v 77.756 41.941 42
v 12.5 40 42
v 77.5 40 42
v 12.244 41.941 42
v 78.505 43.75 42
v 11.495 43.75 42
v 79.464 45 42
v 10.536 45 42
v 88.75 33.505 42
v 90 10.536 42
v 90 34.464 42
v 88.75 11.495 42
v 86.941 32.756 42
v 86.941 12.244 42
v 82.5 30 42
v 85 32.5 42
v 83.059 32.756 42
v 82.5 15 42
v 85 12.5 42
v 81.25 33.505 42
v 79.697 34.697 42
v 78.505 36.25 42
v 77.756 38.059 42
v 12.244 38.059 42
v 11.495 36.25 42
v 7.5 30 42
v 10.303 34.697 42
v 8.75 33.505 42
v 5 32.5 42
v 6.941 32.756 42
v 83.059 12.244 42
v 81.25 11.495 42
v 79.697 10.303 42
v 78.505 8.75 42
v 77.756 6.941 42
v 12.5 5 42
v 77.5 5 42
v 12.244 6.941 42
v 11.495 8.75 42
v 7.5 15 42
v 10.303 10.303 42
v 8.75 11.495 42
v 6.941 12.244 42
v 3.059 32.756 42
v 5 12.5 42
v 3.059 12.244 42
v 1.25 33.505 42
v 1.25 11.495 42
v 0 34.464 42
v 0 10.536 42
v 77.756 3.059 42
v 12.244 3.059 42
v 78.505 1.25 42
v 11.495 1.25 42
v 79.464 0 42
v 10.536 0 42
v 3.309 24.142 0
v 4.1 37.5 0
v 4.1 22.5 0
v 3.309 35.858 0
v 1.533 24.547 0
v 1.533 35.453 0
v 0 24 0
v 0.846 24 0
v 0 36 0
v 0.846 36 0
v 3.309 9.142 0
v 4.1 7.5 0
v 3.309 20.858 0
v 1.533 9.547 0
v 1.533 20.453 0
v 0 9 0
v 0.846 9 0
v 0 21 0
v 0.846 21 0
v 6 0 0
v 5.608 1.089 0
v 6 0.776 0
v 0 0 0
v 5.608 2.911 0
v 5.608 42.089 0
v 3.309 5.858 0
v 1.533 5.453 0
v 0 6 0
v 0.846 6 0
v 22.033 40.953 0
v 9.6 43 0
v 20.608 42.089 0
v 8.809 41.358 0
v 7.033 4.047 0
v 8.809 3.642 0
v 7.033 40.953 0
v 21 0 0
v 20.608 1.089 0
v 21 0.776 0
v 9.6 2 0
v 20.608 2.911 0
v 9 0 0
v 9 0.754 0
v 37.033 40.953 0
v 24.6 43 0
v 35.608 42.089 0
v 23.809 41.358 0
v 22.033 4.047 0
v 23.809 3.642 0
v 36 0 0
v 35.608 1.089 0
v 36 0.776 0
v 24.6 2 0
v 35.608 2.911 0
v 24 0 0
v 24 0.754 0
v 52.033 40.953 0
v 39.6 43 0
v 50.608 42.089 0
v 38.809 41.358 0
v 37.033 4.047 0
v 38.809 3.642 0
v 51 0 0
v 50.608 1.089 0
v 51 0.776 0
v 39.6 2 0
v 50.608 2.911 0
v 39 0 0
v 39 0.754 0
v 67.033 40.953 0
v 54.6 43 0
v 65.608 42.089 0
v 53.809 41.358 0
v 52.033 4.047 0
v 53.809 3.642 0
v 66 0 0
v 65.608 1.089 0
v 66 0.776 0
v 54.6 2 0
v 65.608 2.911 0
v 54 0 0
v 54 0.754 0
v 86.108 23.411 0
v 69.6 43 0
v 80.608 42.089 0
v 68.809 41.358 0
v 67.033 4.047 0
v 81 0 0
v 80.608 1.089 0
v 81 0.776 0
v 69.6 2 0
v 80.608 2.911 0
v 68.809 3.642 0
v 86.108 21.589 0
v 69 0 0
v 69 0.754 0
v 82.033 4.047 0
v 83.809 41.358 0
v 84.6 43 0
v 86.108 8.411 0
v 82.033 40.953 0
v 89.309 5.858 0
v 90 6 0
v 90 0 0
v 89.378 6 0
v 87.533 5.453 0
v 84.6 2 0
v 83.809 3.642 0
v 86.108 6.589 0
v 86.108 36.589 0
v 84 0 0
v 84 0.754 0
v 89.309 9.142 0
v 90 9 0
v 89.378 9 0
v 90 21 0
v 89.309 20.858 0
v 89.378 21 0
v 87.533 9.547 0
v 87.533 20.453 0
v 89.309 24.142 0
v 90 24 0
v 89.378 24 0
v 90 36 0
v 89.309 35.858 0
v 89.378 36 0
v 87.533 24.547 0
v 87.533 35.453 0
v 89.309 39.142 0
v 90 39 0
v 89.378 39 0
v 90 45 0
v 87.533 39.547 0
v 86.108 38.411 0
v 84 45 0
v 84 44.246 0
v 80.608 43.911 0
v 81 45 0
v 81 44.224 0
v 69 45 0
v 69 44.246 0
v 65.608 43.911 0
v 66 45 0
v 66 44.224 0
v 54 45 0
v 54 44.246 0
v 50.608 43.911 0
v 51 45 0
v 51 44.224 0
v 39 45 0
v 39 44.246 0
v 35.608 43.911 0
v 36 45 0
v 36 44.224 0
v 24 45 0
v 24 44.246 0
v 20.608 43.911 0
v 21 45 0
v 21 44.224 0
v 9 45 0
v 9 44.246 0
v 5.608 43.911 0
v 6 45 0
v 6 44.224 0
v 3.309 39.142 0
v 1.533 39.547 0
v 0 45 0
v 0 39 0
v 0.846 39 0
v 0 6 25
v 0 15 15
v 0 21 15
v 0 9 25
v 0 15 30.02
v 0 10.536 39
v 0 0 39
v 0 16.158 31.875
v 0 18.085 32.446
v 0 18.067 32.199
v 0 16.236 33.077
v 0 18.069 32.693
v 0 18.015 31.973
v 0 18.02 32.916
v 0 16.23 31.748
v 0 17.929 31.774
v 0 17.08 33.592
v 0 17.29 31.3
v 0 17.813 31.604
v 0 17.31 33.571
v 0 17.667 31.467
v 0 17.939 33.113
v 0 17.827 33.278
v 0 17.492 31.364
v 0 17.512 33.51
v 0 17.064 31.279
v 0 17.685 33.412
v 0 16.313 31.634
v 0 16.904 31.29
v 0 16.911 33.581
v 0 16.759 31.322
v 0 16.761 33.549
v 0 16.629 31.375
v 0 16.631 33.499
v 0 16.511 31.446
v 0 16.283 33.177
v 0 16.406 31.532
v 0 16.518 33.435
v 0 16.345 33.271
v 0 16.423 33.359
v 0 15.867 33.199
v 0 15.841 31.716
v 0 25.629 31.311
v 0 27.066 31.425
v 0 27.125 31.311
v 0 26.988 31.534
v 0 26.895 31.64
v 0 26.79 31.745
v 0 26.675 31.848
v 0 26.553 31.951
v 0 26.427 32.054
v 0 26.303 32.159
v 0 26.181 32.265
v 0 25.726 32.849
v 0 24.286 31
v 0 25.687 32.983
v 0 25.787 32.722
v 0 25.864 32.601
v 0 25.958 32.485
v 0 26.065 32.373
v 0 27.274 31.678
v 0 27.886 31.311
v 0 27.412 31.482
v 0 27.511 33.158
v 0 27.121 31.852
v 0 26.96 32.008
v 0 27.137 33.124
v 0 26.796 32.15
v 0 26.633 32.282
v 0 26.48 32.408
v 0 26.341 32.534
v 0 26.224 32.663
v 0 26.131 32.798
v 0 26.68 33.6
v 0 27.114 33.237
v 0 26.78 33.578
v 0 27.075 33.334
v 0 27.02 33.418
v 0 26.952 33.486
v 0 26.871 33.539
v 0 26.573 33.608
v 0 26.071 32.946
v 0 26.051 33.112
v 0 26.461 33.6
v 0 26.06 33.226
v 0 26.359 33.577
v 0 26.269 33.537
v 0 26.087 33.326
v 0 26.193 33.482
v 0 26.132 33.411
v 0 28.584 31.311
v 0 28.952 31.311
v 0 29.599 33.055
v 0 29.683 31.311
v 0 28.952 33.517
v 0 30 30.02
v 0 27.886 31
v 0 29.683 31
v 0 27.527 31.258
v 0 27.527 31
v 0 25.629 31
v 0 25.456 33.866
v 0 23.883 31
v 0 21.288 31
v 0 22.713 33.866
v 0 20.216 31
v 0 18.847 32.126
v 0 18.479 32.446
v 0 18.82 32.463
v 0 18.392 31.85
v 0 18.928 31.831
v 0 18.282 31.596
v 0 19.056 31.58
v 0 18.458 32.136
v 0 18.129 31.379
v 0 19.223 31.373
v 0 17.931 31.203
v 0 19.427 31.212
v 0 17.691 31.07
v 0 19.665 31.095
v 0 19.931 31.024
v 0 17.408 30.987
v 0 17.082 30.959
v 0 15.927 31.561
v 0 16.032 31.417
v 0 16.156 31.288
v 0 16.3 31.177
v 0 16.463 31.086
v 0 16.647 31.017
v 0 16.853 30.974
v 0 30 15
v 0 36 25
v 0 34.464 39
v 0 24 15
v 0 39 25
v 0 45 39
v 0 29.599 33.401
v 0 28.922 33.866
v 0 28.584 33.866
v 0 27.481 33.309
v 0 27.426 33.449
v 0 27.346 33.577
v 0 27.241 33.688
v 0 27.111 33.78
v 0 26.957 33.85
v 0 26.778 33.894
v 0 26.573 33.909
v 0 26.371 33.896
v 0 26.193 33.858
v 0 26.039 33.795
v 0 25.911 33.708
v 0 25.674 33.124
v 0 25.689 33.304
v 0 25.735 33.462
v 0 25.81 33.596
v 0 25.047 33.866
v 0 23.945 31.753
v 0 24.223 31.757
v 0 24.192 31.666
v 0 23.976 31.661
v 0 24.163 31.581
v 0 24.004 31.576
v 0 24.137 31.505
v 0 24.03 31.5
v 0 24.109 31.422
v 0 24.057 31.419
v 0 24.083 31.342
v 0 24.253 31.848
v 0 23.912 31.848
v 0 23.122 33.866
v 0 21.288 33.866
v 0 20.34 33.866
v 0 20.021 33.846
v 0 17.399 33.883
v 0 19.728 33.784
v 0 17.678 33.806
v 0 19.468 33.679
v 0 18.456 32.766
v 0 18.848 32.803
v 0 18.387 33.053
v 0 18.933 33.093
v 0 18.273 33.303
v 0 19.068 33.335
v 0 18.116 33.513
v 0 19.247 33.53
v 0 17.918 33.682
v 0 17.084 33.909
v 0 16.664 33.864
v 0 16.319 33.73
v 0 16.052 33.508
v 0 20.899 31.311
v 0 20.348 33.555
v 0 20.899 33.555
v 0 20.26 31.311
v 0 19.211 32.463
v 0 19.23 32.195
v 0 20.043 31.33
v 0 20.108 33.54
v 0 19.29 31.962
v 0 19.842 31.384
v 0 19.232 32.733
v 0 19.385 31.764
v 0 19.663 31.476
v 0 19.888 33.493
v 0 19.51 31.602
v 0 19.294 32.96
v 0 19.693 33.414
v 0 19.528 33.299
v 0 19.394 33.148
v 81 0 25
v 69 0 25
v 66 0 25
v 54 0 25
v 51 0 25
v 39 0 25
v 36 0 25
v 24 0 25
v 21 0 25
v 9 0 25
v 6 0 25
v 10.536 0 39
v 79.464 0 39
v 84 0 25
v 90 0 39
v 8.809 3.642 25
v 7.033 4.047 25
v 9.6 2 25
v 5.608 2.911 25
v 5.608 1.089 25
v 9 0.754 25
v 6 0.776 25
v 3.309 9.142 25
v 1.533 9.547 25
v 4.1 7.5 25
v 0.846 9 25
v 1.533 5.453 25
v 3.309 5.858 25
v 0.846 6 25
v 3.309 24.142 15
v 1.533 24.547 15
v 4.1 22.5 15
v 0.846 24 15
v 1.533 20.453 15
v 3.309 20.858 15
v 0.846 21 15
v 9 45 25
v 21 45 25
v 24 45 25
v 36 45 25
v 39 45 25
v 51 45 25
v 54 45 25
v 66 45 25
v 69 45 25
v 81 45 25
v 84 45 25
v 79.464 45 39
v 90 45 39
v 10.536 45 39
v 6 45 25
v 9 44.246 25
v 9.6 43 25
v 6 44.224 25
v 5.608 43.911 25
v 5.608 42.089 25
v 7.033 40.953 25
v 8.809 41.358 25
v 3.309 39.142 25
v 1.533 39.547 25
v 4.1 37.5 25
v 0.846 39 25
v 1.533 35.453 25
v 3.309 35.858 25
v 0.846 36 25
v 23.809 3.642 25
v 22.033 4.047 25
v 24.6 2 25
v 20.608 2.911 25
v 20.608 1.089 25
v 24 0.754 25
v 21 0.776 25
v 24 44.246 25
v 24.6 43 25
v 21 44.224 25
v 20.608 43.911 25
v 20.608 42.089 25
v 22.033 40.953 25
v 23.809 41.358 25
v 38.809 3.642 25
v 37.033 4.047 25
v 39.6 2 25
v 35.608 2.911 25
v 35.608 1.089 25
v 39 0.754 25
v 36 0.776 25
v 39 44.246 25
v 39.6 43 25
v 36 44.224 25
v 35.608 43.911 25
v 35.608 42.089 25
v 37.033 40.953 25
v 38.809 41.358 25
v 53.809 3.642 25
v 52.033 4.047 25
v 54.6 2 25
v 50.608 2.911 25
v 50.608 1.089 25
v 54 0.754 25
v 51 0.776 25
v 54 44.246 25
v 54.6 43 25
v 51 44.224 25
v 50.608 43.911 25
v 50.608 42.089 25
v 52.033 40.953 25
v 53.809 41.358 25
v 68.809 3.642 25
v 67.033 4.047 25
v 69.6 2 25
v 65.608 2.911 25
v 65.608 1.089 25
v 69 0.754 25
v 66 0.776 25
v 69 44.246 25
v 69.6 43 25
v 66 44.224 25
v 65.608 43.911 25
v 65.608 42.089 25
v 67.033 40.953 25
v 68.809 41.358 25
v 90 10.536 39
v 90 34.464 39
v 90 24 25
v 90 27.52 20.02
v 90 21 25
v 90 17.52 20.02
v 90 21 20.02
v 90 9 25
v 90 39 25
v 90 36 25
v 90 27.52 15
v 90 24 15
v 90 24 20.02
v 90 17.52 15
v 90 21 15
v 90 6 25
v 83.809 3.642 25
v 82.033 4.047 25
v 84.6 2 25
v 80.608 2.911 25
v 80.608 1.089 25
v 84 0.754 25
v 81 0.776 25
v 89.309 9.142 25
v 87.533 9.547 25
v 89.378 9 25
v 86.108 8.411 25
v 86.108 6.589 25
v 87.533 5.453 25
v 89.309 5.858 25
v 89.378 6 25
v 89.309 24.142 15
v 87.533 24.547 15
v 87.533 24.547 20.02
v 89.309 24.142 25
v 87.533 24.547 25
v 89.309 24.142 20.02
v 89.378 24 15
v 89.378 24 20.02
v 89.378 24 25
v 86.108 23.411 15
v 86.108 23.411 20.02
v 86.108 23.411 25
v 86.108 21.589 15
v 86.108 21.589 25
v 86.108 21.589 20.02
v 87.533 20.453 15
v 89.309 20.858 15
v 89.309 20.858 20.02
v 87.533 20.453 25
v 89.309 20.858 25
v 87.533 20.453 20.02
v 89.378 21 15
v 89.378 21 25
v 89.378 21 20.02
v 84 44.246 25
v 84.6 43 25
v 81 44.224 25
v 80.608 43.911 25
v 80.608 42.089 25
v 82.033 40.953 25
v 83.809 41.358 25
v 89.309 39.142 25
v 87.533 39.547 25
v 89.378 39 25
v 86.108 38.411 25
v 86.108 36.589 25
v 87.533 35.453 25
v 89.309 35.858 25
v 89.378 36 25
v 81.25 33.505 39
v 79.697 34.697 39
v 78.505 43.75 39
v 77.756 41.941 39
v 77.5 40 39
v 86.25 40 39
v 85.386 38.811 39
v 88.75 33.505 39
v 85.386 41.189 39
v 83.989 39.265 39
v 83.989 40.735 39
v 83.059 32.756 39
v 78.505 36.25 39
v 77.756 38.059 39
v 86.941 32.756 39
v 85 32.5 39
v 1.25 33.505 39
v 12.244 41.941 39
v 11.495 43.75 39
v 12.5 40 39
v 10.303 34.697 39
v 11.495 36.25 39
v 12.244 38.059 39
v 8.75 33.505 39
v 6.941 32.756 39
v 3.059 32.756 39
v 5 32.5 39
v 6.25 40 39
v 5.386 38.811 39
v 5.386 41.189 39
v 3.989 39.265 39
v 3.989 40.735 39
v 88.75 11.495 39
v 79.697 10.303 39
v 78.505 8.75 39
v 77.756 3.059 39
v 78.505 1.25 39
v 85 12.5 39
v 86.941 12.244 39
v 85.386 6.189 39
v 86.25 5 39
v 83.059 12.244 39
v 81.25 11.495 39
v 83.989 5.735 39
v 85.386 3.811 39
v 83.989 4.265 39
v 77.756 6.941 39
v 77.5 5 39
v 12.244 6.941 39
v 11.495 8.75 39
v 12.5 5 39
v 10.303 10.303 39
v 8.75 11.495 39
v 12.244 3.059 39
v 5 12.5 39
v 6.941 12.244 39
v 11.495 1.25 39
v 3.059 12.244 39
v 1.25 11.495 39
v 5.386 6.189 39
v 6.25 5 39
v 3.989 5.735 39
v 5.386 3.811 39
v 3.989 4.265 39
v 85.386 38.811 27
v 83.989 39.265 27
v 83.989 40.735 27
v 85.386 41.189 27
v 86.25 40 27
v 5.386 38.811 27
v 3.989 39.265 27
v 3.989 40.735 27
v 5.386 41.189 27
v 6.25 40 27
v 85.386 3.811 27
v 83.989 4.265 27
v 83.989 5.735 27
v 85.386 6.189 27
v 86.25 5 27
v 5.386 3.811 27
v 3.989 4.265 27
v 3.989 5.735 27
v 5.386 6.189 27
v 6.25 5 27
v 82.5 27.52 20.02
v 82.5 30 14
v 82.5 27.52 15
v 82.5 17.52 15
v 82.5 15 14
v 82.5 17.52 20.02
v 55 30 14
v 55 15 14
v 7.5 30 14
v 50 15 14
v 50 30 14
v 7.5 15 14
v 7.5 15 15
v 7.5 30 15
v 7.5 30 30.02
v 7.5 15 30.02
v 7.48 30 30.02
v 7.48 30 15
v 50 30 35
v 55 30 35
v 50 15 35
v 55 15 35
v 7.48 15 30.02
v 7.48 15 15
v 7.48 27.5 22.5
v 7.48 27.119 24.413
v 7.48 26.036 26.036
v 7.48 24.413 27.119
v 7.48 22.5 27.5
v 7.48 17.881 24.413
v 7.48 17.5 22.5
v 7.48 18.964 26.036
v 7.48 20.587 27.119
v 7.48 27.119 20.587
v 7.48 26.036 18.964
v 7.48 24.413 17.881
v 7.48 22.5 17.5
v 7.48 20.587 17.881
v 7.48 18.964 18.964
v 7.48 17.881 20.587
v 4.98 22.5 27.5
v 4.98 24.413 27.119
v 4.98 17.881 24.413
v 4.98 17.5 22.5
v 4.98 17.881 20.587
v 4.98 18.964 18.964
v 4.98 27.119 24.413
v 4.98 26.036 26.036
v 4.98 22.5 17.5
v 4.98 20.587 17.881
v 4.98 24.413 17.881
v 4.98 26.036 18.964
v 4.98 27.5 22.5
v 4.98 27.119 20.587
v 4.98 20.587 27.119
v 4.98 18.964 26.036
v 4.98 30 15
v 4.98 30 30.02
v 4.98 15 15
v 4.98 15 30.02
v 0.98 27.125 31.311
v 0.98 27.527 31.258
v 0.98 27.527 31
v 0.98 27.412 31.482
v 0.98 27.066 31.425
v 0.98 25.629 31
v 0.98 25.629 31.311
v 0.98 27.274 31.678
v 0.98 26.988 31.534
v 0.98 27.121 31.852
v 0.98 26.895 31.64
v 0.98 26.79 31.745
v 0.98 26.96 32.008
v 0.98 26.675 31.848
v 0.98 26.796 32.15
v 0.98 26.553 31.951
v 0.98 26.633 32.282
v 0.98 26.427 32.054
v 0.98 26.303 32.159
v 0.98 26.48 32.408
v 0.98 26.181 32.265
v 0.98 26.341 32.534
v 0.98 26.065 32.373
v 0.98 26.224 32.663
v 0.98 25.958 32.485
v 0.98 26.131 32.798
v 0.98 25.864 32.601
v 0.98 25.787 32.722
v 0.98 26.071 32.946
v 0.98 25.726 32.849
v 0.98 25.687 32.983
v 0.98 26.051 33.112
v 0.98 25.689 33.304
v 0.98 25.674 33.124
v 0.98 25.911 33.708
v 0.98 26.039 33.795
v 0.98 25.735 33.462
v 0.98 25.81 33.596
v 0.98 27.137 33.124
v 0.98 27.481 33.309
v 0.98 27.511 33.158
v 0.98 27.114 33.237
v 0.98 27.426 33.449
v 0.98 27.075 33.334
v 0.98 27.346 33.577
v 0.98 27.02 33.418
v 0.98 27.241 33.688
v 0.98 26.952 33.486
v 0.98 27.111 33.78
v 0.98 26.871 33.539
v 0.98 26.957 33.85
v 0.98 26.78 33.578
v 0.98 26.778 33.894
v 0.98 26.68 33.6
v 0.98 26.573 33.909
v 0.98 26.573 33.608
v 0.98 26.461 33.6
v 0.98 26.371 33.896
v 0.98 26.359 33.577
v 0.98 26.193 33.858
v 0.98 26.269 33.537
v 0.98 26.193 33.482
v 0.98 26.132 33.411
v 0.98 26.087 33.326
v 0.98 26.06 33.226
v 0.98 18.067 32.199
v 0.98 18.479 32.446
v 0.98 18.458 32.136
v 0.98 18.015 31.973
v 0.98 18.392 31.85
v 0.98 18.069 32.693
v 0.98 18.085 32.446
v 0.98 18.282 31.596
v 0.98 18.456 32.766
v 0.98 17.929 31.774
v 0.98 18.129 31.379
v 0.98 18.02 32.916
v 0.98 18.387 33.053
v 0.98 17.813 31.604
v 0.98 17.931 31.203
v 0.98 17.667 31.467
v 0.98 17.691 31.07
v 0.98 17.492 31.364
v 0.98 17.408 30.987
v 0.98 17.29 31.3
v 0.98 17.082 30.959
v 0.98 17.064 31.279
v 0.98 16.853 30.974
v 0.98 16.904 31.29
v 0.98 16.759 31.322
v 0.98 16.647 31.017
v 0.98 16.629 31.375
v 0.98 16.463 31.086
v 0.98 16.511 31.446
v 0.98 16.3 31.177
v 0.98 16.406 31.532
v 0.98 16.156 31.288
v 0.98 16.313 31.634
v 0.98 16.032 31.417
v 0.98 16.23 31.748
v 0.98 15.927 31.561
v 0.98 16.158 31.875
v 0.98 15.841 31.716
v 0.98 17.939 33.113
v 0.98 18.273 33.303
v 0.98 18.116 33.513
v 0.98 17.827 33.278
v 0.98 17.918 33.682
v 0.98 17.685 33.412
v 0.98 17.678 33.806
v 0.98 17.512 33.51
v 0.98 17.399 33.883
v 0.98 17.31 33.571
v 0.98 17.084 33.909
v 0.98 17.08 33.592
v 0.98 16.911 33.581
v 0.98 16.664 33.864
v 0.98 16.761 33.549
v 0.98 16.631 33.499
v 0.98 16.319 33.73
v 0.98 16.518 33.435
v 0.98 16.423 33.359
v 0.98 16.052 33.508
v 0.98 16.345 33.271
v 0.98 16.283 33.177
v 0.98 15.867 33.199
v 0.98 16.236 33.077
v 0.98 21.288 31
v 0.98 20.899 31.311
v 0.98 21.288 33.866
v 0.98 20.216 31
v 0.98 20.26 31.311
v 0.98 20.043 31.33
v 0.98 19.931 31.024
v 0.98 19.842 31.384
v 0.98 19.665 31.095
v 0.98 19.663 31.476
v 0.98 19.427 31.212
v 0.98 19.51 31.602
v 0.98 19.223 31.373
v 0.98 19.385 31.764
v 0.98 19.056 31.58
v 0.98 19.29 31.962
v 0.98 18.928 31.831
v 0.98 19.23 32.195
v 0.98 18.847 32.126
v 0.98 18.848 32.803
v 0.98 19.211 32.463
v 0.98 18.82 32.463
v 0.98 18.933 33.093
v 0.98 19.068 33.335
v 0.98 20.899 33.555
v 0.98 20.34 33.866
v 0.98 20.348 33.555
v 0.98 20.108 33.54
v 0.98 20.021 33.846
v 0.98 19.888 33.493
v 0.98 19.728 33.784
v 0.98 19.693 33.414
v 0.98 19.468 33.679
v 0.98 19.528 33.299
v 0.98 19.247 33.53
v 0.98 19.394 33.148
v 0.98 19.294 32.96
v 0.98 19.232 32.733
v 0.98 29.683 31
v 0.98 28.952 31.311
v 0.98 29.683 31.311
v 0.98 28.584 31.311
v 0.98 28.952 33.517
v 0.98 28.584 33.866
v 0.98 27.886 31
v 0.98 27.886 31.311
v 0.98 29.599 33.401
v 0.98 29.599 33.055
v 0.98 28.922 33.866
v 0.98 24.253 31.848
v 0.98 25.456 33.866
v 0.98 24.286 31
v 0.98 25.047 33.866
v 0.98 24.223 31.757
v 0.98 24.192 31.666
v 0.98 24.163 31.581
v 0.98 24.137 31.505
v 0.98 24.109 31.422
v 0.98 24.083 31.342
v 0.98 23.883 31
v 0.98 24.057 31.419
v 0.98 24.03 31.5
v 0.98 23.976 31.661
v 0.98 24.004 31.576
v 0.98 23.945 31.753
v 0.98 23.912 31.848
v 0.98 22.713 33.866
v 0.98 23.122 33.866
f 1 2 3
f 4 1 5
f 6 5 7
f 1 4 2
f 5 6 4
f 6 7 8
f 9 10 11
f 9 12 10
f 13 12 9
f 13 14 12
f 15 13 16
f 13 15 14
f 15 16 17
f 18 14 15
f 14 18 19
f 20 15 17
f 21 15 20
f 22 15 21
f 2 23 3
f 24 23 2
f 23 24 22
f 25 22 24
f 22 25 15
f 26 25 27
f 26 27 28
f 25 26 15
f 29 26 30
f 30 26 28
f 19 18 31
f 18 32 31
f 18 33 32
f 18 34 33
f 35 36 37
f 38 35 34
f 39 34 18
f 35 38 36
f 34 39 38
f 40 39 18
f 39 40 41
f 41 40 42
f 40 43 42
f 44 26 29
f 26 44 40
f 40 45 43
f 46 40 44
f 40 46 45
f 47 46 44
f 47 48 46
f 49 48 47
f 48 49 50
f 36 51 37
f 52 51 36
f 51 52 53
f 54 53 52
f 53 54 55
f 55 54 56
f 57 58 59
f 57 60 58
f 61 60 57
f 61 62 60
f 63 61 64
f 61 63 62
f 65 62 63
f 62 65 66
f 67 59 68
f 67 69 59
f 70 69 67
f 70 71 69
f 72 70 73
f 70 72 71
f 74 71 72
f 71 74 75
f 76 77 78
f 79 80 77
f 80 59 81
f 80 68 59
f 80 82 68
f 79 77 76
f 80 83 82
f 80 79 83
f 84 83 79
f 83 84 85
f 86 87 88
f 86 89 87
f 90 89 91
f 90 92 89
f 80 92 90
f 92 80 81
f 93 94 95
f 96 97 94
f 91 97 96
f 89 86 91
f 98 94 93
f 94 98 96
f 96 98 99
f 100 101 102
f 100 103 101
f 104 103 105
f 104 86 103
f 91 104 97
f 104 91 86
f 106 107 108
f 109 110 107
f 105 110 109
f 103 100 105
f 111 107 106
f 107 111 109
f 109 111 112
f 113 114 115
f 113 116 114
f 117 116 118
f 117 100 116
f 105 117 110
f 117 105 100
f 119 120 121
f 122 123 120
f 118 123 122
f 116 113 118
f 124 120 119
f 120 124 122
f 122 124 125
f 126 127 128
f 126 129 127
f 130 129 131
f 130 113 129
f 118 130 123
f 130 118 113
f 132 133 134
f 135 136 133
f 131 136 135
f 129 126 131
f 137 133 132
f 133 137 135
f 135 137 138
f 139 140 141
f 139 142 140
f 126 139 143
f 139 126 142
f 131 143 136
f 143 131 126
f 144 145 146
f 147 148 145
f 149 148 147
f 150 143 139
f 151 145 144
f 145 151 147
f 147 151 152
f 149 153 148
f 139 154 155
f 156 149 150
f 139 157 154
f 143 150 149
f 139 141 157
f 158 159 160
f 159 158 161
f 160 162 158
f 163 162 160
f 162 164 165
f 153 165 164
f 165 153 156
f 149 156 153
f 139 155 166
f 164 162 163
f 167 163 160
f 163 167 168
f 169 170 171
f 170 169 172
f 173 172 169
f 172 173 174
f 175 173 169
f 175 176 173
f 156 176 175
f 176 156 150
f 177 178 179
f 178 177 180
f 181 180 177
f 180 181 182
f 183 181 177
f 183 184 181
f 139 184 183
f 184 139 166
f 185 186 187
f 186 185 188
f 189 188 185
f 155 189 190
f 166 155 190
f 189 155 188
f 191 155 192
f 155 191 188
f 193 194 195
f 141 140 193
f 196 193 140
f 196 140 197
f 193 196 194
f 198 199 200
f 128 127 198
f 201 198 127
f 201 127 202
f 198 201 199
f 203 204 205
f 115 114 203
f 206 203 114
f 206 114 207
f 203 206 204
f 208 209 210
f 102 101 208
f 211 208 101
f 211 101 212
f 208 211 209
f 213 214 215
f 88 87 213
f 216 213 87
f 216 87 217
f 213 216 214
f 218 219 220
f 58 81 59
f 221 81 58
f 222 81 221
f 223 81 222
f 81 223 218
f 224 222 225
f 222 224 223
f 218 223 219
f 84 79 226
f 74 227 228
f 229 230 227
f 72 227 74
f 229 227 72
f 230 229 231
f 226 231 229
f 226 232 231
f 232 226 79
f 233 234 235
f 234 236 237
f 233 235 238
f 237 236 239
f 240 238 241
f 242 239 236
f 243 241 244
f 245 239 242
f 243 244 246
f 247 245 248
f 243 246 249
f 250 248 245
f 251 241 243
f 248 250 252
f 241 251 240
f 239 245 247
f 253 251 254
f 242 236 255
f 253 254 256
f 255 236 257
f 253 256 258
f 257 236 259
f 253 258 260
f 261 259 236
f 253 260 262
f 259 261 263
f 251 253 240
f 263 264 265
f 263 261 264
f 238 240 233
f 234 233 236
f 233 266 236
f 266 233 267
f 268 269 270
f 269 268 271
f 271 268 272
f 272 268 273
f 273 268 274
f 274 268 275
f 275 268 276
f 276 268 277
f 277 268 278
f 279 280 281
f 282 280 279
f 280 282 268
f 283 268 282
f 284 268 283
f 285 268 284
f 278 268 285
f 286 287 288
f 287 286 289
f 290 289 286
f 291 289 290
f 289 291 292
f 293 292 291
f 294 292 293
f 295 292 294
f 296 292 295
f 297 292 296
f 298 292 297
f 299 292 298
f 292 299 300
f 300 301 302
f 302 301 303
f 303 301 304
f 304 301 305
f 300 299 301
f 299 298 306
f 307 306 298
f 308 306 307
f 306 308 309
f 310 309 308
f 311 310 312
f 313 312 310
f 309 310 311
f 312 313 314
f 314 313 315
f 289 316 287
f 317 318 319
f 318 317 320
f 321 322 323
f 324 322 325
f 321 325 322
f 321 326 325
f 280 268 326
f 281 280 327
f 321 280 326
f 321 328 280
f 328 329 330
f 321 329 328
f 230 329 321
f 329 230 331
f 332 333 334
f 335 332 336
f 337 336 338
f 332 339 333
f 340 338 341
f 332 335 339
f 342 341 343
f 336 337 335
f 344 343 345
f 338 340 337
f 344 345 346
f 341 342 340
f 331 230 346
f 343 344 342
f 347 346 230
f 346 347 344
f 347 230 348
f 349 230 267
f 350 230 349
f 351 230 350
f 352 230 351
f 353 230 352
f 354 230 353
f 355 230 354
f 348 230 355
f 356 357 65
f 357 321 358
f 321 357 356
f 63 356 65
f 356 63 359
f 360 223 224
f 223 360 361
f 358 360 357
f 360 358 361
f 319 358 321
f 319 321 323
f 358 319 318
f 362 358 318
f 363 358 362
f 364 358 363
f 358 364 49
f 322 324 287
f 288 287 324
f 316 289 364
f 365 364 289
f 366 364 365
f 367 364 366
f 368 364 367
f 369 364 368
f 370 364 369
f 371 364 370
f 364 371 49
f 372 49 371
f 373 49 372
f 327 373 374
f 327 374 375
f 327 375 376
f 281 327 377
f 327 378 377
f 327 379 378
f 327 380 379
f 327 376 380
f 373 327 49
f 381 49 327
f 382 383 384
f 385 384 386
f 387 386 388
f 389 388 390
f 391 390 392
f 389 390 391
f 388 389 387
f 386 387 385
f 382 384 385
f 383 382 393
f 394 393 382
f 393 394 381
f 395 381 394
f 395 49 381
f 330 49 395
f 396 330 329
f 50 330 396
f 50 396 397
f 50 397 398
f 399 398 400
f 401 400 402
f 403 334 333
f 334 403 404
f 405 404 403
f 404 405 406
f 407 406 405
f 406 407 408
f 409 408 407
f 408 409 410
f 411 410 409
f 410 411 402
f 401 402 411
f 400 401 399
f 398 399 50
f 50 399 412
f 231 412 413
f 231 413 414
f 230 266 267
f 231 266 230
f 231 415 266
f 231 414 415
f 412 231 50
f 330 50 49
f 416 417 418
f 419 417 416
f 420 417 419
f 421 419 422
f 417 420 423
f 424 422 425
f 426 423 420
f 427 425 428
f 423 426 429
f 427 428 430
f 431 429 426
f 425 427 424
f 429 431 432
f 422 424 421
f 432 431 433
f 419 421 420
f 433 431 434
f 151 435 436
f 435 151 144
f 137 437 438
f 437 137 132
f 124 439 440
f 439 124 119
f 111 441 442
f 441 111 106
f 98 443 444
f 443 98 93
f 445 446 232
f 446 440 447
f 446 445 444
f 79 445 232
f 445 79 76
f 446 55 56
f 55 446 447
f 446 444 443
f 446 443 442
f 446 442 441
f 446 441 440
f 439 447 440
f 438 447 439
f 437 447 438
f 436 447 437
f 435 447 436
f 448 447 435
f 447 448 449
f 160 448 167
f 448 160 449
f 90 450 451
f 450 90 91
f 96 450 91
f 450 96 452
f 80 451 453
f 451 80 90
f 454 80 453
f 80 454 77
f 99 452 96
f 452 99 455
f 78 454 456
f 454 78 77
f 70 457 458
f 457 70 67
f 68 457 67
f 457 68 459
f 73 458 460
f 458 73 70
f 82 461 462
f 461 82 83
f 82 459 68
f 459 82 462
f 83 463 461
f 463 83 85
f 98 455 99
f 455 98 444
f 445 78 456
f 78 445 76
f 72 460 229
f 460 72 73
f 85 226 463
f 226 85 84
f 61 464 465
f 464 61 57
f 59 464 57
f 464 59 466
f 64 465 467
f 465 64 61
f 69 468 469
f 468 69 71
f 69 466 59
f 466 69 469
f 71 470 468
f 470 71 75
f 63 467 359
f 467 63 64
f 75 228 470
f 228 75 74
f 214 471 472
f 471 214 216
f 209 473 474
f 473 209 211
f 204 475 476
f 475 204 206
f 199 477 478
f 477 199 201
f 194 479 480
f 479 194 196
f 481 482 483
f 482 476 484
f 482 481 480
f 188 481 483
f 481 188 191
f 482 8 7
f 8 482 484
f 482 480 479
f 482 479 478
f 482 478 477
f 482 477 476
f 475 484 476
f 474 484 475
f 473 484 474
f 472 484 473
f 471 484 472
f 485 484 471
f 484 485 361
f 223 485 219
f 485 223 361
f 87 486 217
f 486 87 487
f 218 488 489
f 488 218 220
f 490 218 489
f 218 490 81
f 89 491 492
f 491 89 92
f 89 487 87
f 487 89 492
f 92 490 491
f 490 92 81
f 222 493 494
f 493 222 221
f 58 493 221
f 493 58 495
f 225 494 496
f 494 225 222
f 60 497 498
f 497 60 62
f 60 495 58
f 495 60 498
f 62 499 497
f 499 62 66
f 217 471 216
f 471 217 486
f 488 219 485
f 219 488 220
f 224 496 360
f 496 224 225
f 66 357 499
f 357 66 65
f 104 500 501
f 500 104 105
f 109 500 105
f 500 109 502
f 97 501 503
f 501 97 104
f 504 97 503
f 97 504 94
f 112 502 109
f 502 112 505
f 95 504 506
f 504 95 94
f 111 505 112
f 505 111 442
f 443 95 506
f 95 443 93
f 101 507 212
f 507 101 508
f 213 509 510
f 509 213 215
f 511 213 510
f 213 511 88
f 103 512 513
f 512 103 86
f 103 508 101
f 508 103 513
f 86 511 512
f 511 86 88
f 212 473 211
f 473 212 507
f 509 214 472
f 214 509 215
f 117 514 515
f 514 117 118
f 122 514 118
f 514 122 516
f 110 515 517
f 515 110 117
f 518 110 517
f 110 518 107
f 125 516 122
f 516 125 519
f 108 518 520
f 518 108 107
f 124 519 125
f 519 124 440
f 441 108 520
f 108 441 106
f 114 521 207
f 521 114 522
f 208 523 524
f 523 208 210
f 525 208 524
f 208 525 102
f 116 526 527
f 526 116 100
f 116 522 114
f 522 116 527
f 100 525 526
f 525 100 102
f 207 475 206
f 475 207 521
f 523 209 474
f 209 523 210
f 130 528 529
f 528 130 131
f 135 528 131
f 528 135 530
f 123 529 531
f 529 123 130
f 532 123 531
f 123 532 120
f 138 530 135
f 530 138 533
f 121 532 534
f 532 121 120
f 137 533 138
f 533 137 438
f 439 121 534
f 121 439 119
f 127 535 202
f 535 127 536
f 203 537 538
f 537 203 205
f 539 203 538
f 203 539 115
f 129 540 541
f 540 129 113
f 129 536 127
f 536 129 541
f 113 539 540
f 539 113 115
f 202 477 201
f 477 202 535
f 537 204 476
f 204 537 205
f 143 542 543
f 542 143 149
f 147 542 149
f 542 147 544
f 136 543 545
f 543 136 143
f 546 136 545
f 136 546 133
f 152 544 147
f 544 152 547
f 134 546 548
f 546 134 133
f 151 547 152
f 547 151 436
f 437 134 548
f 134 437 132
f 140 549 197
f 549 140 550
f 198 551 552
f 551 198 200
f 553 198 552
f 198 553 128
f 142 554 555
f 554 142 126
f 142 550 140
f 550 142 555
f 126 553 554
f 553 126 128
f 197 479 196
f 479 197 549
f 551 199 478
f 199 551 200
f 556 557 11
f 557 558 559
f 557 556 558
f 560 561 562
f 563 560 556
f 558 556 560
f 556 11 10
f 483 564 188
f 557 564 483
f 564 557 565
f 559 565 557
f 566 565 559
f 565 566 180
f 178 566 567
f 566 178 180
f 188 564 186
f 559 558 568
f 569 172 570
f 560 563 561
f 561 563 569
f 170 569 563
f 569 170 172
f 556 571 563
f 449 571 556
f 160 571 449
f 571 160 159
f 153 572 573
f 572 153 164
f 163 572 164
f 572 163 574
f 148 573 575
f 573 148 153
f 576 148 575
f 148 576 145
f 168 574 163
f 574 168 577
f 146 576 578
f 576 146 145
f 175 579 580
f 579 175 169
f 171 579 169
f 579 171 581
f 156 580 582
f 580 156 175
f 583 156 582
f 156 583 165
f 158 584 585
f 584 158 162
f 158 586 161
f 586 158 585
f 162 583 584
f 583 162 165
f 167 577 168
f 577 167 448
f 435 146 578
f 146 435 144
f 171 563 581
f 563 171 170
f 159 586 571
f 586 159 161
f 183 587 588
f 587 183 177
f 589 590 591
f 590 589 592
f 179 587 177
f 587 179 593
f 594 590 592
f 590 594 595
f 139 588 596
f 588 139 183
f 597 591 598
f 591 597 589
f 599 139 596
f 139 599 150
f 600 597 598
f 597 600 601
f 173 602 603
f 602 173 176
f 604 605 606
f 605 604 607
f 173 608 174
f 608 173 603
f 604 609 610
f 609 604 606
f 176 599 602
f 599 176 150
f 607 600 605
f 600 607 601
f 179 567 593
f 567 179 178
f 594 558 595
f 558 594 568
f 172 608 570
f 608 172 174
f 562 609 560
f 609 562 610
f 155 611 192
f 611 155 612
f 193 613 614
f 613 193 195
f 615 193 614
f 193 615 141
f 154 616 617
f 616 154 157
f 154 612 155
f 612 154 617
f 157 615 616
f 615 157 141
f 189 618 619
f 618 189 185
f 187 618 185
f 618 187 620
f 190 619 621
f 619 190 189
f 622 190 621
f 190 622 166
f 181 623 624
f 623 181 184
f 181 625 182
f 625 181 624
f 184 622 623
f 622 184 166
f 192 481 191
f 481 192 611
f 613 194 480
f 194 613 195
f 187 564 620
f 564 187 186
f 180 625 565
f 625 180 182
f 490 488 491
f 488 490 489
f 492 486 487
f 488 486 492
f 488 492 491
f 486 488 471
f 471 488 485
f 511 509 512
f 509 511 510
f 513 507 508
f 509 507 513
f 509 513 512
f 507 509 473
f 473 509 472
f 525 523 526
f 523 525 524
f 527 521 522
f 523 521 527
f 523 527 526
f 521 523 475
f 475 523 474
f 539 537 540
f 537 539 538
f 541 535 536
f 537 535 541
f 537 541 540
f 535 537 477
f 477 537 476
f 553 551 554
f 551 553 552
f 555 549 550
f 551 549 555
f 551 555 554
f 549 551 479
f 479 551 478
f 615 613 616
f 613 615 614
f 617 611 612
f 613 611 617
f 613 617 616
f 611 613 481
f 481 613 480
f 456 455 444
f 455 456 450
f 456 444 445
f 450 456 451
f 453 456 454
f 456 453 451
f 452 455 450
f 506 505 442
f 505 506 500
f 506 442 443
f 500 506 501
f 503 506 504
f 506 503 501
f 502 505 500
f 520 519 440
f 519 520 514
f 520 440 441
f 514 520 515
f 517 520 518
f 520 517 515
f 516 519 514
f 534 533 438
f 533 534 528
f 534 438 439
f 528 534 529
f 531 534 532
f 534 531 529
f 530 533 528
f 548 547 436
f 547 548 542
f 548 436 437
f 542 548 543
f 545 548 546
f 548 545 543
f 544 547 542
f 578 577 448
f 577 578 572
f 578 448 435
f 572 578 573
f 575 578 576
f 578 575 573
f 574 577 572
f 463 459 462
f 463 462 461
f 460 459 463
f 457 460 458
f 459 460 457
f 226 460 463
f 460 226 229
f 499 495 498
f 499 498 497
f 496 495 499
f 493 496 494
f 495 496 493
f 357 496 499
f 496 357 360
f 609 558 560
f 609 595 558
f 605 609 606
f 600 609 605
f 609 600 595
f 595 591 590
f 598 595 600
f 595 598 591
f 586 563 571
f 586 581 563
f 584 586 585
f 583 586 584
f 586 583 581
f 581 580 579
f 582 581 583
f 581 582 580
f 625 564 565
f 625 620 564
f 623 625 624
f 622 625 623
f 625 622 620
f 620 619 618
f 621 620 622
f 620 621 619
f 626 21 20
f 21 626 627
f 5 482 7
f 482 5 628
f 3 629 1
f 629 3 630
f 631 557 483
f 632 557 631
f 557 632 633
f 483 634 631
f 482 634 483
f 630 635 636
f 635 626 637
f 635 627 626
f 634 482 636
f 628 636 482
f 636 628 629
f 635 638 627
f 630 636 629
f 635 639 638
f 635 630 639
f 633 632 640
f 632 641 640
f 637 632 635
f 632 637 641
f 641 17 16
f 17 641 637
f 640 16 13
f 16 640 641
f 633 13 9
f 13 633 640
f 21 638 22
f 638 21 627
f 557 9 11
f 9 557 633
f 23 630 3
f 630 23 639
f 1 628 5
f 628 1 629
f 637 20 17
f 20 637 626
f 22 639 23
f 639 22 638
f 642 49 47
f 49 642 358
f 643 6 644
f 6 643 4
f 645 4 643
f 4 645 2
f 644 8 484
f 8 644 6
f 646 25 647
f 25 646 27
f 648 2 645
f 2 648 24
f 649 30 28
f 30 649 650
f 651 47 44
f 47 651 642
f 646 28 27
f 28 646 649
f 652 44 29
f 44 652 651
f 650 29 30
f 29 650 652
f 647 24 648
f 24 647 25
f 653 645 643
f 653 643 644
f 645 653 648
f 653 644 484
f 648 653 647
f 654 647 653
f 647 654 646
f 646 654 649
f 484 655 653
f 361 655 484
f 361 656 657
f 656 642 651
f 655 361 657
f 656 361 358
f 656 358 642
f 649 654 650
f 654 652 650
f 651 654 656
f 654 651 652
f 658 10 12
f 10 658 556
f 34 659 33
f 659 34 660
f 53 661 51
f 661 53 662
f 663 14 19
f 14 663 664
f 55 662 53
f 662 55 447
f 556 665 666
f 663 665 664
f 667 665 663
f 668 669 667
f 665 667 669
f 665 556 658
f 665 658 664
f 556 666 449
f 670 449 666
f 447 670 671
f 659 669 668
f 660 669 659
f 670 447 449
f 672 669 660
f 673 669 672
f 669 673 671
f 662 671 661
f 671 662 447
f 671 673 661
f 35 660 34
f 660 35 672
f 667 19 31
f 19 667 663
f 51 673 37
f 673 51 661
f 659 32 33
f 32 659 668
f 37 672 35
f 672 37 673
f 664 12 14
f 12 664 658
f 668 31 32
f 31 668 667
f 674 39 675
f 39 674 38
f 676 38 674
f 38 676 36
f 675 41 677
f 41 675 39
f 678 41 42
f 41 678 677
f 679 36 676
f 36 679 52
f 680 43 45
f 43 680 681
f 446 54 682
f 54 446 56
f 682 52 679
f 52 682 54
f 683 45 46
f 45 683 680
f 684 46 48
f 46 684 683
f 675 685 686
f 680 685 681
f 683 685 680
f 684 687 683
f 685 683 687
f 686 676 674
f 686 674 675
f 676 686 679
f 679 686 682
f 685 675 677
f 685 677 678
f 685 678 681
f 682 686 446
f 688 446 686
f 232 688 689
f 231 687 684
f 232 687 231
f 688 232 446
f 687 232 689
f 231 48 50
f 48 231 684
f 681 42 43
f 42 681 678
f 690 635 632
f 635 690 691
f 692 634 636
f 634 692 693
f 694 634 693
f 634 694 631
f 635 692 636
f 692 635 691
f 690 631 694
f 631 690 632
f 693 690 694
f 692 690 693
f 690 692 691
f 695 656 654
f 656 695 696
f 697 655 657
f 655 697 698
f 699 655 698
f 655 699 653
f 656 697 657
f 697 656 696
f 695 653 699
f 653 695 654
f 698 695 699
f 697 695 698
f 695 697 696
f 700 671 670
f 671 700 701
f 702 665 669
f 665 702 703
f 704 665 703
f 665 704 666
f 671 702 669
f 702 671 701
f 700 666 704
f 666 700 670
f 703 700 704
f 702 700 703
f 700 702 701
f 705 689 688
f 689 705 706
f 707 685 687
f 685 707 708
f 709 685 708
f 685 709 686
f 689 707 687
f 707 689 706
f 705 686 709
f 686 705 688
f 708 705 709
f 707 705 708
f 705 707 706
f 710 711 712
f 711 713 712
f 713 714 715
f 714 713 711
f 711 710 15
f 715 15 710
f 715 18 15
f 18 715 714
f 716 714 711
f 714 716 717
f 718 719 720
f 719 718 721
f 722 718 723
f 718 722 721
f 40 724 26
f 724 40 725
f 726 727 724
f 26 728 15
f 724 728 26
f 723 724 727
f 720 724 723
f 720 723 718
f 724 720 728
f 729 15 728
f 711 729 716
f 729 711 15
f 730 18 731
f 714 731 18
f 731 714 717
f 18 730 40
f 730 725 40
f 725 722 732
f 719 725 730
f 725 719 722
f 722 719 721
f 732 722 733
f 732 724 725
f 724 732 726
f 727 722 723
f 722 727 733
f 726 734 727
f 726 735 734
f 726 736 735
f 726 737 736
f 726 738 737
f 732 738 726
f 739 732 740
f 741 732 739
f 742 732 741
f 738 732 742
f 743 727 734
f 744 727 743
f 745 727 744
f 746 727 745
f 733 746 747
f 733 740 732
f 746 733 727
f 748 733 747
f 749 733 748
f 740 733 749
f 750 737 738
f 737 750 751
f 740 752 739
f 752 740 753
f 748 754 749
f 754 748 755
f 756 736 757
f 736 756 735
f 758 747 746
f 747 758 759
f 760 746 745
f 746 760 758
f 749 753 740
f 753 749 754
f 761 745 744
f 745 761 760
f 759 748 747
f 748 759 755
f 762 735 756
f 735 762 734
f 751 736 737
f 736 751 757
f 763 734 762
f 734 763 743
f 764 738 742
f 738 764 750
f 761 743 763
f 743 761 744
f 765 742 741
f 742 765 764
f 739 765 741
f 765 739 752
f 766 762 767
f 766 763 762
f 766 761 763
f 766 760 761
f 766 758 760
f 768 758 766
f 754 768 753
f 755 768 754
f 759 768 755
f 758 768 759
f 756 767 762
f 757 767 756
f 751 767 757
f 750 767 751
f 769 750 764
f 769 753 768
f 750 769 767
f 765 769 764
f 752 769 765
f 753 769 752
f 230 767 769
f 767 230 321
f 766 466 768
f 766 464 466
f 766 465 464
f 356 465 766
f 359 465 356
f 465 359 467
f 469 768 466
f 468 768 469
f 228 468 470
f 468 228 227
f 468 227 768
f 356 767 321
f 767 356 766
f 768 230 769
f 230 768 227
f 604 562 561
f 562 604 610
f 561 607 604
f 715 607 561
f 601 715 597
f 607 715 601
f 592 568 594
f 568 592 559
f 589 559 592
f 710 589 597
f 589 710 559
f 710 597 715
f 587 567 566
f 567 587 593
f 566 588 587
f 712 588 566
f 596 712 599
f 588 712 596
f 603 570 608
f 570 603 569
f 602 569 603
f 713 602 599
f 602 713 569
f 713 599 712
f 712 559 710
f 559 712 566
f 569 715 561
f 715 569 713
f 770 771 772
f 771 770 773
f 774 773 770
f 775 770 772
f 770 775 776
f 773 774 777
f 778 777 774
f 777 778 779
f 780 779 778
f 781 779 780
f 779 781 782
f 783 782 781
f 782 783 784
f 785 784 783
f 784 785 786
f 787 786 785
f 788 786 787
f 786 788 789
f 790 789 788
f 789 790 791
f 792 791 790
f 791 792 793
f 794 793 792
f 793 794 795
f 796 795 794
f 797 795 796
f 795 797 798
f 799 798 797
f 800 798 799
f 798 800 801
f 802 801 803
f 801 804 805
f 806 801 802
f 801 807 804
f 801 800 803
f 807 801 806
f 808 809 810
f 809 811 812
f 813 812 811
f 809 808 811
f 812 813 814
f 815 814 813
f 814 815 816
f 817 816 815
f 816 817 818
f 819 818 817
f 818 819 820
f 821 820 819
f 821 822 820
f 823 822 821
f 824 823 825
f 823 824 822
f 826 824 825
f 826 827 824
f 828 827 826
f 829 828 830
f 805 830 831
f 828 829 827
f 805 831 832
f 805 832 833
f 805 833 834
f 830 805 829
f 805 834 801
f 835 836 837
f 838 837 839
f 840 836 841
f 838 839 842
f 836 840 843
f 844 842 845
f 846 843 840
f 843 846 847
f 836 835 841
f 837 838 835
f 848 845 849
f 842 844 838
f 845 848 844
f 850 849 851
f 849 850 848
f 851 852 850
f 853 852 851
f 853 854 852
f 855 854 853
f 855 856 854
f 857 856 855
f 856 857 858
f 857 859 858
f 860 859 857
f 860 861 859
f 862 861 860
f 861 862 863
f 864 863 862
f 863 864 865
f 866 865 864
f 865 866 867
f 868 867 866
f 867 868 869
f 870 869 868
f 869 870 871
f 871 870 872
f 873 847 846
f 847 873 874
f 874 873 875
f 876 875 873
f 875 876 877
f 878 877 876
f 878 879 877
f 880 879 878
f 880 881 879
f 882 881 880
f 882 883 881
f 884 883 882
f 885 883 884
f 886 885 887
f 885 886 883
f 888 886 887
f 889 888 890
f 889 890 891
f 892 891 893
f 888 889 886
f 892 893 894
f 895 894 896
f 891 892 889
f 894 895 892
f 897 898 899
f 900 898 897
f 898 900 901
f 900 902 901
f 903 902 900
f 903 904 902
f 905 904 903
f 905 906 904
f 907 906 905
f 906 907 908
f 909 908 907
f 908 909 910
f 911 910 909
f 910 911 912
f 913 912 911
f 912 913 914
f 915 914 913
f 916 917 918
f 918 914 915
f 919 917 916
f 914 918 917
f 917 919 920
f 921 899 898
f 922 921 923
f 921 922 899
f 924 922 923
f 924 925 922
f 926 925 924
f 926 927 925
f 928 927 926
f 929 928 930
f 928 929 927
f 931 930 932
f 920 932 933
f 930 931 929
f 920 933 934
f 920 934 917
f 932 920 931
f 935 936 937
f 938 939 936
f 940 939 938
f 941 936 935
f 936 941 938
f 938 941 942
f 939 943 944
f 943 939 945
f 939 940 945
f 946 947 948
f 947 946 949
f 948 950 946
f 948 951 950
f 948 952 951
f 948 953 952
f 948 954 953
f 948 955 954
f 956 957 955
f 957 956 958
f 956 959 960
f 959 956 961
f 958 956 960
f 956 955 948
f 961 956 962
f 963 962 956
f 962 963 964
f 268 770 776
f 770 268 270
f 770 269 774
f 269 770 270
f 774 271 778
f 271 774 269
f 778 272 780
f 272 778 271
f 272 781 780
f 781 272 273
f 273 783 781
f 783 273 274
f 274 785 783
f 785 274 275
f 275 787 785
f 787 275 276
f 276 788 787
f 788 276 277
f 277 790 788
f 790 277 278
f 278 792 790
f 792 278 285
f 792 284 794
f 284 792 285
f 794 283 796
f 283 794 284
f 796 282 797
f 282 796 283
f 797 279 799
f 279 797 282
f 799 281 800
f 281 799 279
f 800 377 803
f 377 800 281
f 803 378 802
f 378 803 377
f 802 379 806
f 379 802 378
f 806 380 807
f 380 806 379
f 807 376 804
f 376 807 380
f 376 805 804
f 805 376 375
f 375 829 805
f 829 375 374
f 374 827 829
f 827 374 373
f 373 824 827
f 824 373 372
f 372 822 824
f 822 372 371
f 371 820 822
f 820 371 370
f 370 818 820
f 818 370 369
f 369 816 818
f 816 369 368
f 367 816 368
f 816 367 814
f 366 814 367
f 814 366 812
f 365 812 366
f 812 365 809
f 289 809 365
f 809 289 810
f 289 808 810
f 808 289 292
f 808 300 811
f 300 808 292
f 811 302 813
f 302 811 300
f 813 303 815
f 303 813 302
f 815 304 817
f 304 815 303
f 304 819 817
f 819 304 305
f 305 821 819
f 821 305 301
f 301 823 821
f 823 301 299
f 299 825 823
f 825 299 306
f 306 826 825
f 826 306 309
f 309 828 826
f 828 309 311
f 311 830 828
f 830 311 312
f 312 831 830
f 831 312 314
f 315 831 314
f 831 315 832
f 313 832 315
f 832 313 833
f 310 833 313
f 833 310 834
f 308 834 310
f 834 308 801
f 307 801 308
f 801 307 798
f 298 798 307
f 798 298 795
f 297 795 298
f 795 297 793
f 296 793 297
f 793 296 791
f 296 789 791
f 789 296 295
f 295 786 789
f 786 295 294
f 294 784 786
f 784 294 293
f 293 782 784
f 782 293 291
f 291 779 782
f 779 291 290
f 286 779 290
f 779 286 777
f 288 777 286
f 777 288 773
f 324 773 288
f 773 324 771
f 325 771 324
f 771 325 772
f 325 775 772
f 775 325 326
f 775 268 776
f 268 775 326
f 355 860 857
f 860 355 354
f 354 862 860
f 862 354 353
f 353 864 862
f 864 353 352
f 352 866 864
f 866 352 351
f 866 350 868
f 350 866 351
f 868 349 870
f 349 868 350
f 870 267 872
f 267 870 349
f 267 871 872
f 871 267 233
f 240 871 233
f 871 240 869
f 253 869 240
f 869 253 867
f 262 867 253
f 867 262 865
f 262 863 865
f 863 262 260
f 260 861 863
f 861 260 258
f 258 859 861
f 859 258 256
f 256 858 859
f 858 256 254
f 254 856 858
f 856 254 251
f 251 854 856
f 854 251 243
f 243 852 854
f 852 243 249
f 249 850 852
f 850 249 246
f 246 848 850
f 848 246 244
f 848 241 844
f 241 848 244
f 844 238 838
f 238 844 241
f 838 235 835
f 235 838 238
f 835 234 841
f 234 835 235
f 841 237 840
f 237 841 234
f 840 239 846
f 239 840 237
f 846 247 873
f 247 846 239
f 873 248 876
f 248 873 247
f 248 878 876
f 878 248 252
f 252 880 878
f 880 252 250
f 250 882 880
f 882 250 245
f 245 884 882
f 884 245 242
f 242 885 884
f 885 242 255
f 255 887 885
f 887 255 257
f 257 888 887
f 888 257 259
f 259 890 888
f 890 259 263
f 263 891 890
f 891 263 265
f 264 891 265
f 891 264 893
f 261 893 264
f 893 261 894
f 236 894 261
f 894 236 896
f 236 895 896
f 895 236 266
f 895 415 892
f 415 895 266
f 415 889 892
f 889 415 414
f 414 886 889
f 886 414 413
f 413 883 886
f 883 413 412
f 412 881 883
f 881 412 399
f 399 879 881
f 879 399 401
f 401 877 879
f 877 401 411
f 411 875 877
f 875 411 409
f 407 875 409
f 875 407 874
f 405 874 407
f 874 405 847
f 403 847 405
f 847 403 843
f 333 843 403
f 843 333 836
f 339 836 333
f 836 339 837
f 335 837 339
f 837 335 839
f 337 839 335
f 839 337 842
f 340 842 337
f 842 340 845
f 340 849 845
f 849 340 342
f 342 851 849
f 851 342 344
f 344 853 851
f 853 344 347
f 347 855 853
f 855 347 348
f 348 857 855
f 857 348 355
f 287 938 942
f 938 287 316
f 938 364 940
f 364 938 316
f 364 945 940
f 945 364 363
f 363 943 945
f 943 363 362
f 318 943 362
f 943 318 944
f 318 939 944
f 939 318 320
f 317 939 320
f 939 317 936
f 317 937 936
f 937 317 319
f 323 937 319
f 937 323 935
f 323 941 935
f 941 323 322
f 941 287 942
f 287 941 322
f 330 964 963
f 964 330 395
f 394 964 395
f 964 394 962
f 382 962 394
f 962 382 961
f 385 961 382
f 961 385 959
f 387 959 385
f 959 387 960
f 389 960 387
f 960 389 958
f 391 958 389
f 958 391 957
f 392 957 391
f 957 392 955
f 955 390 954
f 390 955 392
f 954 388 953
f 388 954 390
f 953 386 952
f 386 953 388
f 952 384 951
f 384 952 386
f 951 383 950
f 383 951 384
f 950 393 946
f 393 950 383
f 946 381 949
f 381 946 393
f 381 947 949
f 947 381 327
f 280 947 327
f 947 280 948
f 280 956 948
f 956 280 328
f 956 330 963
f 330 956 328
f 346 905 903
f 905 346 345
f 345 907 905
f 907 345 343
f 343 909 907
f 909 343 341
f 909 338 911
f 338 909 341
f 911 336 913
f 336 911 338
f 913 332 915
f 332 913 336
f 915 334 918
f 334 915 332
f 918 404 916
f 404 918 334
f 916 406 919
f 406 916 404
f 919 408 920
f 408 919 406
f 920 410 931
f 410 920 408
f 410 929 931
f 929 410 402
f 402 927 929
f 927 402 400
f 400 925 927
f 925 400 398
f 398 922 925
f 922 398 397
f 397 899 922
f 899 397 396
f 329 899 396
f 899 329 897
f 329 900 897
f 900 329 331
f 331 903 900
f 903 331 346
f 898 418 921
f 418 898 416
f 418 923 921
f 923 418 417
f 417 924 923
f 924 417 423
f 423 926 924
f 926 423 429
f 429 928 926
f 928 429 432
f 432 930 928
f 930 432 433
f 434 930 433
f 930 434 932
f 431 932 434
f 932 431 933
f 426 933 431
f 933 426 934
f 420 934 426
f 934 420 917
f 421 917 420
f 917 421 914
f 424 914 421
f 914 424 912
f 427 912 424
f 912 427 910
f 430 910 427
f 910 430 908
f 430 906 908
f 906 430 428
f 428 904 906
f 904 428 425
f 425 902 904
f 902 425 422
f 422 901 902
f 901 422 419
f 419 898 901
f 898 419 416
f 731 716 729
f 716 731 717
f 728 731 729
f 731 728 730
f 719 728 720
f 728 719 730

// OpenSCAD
/*
 * Fischertechnik compatible case for fuse and power connector.
 */

bottomConnectors = false; // Fischertechnik compatible connectors bottom if true

w = 90; // width of case
h = 45; // height of case
c = 30; // height of Fischertechnik connectors
d = 45; // depth of case

t = 3; // height of top
b = h - t; // height of bottom
tsh = 3; // outer height of terminal for screw
tss = 7; // inner height of terminal for screw

wb = 75; // width of board
db = 15; // depth of board
hb = 30; // height of board
hbb = hb - 5 + tsh; // board base bottom

tso = 7.5; // outer radius of terminal for screw
tsi = 2.5/2; // inner radius of terminal for screw bottom
tst = 3.5/2; // inner radius of terminal for screw top
tse = 8.0/2; // radius of edge for screw top
hse = 2.0; // height of edge for screw top
dtx = 1; // depth of text labels
stx = 3; // size of text labels
o = 0.02; // overlap for better preview rendering

fusePowerConnectorCaseBottom();

module fusePowerConnectorCaseBottom() {

    wc1 = 15; // width of power connector block
    hc1 = 15; // height of power connector block (measured from board bottom)
    dc1 = 45 - 10 + 5; // depth of power connector block
    xc1 = 7.5; // x-offset of power connector block (measured from board x=0)
    yc1 = d/2 - wc1/2; // y-offset of power connector block (measured from board y=0)
    rc2 = 5; // radius of power connector cylinder (measured from board bottom)
    dc2 = 5 + o; // depth of power connector cylinder
    xc2 = 5 - o; // x-offset of power connector cylinder (measured from board x=0)
    yc2 = d/2; // y-offset of power connector cylinder (measured from board y=0)
    zc2 = 1.5*rc2; // z-offset of power connector cylinder (measured from board y=0)
    wc3 = 15; // width of power connector frame
    hc3 = 15; // height of power connector frame (measured from board bottom)
    dc3 = 5; // depth of power connector frame
    xc3 = 0; // x-offset of power connector frame (measured from board x=0)
    yc3 = d/2 - wc3/2; // y-offset of power connector frame (measured from board y=0)
    wk = 10; // width of cable slot (together)
    hk = 5; // height of cable slot (measured from board bottom)
    dk = 20; // depth of cable slot
    xk = w - dk + o; // x-offset of cable slot (measured from board x=0)
    yk = d/2 - wk/2; // y-offset of cable slot (measured from board y=0)
    ws = 20; // width of separator
    hs = 30; // height of separator (measured from board bottom)
    ds = 5; // depth of separator
    xs = 45 + 5; // x-offset of separator (measured from board x=0)
    ys = d/2 - ws/2; // y-offset of separator (measured from board y=0)

    tsg = hbb - tsh; // gap between top and screw terminal

    union() {

        w0 = (w - wb)/2;
        d0 = (d - db)/2;
        difference() {

            union() {
            
                // base of case with FT connectors
                dbo = 5; // depth of border
                translate([0, 0, c - 5])cube([w, d, 5 + (b-c)], center=false);
                if (bottomConnectors) {
                    translate([dbo, dbo, dbo])cube([w-2*dbo, d-2*dbo, b-dbo], center=false);
                } else {
                    translate([dbo, dbo, 0])cube([w-2*dbo, d-2*dbo, b], center=false);
                }
                for (i=[0:w/15 - 1]) {
                    for (j=[0:d/15 - 1]) {
                        translate([i*15, j*15, 0])ftiBlock15x15(b);
                        if (i > 0) {
                            translate([i*15, j*15, 0])cube(size=[5, 15, b], center=false);
                        }
                        if (i < (w/15 - 1)) {
                            translate([i*15 + 10, j*15, 0])cube(size=[5, 15, b], center=false);
                        }
                    }
                }
            }

            translate([w0, d0, b - hbb])cube([wb, db, hbb + o], center=false);

            // connectors and cable slot
            translate([0 + xc1 - o, 0 + yc1, 15])cube([dc1, wc1, hc1 + o], center=false);
            translate([0 + xc2 - o, 0 + yc2, 15 + zc2])rotate([0, 90, 0])cylinder(r=rc2, h=dc2 + o, center=false);
            translate([0 + xc3 - o, 0 + yc3, 15])cube([dc3, wc3, hc3 + o], center=false);
            translate([0 + xk, 0 + yk + o, 15])cube([dk, wk, hk + o], center=false);
            translate([0 + xc3 - o + dtx, 0 + yc3 + wc3, 15 + hc3 + 1])rotate([90, 0, -90])linear_extrude(dtx)text("12V DC", size=stx);

            // terminals for screws - cover
            tce = 3; // edge lower
            tcd = 15; // depth of hole for screw
            union() {
                translate([w - 5, d - 5, b - tce])cylinder(r=tso, h=tce + o, center=false);
                translate([0 + 5, d - 5, b - tce])cylinder(r=tso, h=tce + o, center=false);
                translate([w - 5, 0 + 5, b - tce])cylinder(r=tso, h=tce + o, center=false);
                translate([0 + 5, 0 + 5, b - tce])cylinder(r=tso, h=tce + o, center=false);
            }
            union() {
                translate([w - 5, d - 5, b - tcd])cylinder(r=tsi, h=tcd + o, center=false);
                translate([0 + 5, d - 5, b - tcd])cylinder(r=tsi, h=tcd + o, center=false);
                translate([w - 5, 0 + 5, b - tcd])cylinder(r=tsi, h=tcd + o, center=false);
                translate([0 + 5, 0 + 5, b - tcd])cylinder(r=tsi, h=tcd + o, center=false);
            }
        }

        // separator
        translate([0 + xs, 0 + ys, 5])cube([ds, ws, hs], center=false);
    }
}

/*
 * Create Fischertechnik compatible block with length passed by the argument.
 *
 * @param ftiBlockLength end cap length in millimeters (default is 15)
 */
module ftiBlock15x15(ftiBlockLength=15) {

    union() {
        dBlock=15; // block (max) diameter
        
        // Fischertechnik block
        difference() {
            dFti=4; // axis diameter 4mm
            tFti=0.2; // some space around
            gFtiW=3; // with of gap
            gFtiD=2; // depth of gap
            dCyl=dFti + tFti;
            cube([dBlock, dBlock, ftiBlockLength]);
            // axis
            translate([dBlock/2,dFti/2,0])cylinder(h=ftiBlockLength, d=dCyl);
            translate([dBlock/2,dBlock-dFti/2,0])cylinder(h=ftiBlockLength, d=dCyl);
            translate([dBlock-dFti/2,dBlock/2,0])cylinder(h=ftiBlockLength, d=dCyl);
            translate([dFti/2,dBlock/2,0])cylinder(h=ftiBlockLength, d=dCyl);
            // space
            translate([dBlock/2-gFtiW/2,0,0])cube([gFtiW, gFtiD, ftiBlockLength]);
            translate([dBlock/2-gFtiW/2,dBlock-gFtiD,0])cube([gFtiW, gFtiD, ftiBlockLength]);
            translate([dBlock-gFtiW/2,dBlock/2-gFtiW/2,0])cube([gFtiD, gFtiW, ftiBlockLength]);
            translate([0,dBlock/2-gFtiW/2,0])cube([gFtiD, gFtiW, ftiBlockLength]);
            if (bottomConnectors) {
                // orthoganal axis at end
                translate([dBlock/2, dBlock, dFti/2])rotate([90, 0, 0])cylinder(h=dBlock, d=dCyl);
                translate([dBlock/2-dFti/2, dBlock-dFti/2, 0])cube([dCyl, dCyl, dCyl]);
                translate([dBlock/2-dFti/2, 0-dFti/2, 0])cube([dCyl, dCyl, dCyl]);
                translate([dBlock/2+gFtiW/2, 0, -gFtiD/2])rotate([270, 180, 0])cube([gFtiW, gFtiD, dBlock]);
            }
        }
    }
}
